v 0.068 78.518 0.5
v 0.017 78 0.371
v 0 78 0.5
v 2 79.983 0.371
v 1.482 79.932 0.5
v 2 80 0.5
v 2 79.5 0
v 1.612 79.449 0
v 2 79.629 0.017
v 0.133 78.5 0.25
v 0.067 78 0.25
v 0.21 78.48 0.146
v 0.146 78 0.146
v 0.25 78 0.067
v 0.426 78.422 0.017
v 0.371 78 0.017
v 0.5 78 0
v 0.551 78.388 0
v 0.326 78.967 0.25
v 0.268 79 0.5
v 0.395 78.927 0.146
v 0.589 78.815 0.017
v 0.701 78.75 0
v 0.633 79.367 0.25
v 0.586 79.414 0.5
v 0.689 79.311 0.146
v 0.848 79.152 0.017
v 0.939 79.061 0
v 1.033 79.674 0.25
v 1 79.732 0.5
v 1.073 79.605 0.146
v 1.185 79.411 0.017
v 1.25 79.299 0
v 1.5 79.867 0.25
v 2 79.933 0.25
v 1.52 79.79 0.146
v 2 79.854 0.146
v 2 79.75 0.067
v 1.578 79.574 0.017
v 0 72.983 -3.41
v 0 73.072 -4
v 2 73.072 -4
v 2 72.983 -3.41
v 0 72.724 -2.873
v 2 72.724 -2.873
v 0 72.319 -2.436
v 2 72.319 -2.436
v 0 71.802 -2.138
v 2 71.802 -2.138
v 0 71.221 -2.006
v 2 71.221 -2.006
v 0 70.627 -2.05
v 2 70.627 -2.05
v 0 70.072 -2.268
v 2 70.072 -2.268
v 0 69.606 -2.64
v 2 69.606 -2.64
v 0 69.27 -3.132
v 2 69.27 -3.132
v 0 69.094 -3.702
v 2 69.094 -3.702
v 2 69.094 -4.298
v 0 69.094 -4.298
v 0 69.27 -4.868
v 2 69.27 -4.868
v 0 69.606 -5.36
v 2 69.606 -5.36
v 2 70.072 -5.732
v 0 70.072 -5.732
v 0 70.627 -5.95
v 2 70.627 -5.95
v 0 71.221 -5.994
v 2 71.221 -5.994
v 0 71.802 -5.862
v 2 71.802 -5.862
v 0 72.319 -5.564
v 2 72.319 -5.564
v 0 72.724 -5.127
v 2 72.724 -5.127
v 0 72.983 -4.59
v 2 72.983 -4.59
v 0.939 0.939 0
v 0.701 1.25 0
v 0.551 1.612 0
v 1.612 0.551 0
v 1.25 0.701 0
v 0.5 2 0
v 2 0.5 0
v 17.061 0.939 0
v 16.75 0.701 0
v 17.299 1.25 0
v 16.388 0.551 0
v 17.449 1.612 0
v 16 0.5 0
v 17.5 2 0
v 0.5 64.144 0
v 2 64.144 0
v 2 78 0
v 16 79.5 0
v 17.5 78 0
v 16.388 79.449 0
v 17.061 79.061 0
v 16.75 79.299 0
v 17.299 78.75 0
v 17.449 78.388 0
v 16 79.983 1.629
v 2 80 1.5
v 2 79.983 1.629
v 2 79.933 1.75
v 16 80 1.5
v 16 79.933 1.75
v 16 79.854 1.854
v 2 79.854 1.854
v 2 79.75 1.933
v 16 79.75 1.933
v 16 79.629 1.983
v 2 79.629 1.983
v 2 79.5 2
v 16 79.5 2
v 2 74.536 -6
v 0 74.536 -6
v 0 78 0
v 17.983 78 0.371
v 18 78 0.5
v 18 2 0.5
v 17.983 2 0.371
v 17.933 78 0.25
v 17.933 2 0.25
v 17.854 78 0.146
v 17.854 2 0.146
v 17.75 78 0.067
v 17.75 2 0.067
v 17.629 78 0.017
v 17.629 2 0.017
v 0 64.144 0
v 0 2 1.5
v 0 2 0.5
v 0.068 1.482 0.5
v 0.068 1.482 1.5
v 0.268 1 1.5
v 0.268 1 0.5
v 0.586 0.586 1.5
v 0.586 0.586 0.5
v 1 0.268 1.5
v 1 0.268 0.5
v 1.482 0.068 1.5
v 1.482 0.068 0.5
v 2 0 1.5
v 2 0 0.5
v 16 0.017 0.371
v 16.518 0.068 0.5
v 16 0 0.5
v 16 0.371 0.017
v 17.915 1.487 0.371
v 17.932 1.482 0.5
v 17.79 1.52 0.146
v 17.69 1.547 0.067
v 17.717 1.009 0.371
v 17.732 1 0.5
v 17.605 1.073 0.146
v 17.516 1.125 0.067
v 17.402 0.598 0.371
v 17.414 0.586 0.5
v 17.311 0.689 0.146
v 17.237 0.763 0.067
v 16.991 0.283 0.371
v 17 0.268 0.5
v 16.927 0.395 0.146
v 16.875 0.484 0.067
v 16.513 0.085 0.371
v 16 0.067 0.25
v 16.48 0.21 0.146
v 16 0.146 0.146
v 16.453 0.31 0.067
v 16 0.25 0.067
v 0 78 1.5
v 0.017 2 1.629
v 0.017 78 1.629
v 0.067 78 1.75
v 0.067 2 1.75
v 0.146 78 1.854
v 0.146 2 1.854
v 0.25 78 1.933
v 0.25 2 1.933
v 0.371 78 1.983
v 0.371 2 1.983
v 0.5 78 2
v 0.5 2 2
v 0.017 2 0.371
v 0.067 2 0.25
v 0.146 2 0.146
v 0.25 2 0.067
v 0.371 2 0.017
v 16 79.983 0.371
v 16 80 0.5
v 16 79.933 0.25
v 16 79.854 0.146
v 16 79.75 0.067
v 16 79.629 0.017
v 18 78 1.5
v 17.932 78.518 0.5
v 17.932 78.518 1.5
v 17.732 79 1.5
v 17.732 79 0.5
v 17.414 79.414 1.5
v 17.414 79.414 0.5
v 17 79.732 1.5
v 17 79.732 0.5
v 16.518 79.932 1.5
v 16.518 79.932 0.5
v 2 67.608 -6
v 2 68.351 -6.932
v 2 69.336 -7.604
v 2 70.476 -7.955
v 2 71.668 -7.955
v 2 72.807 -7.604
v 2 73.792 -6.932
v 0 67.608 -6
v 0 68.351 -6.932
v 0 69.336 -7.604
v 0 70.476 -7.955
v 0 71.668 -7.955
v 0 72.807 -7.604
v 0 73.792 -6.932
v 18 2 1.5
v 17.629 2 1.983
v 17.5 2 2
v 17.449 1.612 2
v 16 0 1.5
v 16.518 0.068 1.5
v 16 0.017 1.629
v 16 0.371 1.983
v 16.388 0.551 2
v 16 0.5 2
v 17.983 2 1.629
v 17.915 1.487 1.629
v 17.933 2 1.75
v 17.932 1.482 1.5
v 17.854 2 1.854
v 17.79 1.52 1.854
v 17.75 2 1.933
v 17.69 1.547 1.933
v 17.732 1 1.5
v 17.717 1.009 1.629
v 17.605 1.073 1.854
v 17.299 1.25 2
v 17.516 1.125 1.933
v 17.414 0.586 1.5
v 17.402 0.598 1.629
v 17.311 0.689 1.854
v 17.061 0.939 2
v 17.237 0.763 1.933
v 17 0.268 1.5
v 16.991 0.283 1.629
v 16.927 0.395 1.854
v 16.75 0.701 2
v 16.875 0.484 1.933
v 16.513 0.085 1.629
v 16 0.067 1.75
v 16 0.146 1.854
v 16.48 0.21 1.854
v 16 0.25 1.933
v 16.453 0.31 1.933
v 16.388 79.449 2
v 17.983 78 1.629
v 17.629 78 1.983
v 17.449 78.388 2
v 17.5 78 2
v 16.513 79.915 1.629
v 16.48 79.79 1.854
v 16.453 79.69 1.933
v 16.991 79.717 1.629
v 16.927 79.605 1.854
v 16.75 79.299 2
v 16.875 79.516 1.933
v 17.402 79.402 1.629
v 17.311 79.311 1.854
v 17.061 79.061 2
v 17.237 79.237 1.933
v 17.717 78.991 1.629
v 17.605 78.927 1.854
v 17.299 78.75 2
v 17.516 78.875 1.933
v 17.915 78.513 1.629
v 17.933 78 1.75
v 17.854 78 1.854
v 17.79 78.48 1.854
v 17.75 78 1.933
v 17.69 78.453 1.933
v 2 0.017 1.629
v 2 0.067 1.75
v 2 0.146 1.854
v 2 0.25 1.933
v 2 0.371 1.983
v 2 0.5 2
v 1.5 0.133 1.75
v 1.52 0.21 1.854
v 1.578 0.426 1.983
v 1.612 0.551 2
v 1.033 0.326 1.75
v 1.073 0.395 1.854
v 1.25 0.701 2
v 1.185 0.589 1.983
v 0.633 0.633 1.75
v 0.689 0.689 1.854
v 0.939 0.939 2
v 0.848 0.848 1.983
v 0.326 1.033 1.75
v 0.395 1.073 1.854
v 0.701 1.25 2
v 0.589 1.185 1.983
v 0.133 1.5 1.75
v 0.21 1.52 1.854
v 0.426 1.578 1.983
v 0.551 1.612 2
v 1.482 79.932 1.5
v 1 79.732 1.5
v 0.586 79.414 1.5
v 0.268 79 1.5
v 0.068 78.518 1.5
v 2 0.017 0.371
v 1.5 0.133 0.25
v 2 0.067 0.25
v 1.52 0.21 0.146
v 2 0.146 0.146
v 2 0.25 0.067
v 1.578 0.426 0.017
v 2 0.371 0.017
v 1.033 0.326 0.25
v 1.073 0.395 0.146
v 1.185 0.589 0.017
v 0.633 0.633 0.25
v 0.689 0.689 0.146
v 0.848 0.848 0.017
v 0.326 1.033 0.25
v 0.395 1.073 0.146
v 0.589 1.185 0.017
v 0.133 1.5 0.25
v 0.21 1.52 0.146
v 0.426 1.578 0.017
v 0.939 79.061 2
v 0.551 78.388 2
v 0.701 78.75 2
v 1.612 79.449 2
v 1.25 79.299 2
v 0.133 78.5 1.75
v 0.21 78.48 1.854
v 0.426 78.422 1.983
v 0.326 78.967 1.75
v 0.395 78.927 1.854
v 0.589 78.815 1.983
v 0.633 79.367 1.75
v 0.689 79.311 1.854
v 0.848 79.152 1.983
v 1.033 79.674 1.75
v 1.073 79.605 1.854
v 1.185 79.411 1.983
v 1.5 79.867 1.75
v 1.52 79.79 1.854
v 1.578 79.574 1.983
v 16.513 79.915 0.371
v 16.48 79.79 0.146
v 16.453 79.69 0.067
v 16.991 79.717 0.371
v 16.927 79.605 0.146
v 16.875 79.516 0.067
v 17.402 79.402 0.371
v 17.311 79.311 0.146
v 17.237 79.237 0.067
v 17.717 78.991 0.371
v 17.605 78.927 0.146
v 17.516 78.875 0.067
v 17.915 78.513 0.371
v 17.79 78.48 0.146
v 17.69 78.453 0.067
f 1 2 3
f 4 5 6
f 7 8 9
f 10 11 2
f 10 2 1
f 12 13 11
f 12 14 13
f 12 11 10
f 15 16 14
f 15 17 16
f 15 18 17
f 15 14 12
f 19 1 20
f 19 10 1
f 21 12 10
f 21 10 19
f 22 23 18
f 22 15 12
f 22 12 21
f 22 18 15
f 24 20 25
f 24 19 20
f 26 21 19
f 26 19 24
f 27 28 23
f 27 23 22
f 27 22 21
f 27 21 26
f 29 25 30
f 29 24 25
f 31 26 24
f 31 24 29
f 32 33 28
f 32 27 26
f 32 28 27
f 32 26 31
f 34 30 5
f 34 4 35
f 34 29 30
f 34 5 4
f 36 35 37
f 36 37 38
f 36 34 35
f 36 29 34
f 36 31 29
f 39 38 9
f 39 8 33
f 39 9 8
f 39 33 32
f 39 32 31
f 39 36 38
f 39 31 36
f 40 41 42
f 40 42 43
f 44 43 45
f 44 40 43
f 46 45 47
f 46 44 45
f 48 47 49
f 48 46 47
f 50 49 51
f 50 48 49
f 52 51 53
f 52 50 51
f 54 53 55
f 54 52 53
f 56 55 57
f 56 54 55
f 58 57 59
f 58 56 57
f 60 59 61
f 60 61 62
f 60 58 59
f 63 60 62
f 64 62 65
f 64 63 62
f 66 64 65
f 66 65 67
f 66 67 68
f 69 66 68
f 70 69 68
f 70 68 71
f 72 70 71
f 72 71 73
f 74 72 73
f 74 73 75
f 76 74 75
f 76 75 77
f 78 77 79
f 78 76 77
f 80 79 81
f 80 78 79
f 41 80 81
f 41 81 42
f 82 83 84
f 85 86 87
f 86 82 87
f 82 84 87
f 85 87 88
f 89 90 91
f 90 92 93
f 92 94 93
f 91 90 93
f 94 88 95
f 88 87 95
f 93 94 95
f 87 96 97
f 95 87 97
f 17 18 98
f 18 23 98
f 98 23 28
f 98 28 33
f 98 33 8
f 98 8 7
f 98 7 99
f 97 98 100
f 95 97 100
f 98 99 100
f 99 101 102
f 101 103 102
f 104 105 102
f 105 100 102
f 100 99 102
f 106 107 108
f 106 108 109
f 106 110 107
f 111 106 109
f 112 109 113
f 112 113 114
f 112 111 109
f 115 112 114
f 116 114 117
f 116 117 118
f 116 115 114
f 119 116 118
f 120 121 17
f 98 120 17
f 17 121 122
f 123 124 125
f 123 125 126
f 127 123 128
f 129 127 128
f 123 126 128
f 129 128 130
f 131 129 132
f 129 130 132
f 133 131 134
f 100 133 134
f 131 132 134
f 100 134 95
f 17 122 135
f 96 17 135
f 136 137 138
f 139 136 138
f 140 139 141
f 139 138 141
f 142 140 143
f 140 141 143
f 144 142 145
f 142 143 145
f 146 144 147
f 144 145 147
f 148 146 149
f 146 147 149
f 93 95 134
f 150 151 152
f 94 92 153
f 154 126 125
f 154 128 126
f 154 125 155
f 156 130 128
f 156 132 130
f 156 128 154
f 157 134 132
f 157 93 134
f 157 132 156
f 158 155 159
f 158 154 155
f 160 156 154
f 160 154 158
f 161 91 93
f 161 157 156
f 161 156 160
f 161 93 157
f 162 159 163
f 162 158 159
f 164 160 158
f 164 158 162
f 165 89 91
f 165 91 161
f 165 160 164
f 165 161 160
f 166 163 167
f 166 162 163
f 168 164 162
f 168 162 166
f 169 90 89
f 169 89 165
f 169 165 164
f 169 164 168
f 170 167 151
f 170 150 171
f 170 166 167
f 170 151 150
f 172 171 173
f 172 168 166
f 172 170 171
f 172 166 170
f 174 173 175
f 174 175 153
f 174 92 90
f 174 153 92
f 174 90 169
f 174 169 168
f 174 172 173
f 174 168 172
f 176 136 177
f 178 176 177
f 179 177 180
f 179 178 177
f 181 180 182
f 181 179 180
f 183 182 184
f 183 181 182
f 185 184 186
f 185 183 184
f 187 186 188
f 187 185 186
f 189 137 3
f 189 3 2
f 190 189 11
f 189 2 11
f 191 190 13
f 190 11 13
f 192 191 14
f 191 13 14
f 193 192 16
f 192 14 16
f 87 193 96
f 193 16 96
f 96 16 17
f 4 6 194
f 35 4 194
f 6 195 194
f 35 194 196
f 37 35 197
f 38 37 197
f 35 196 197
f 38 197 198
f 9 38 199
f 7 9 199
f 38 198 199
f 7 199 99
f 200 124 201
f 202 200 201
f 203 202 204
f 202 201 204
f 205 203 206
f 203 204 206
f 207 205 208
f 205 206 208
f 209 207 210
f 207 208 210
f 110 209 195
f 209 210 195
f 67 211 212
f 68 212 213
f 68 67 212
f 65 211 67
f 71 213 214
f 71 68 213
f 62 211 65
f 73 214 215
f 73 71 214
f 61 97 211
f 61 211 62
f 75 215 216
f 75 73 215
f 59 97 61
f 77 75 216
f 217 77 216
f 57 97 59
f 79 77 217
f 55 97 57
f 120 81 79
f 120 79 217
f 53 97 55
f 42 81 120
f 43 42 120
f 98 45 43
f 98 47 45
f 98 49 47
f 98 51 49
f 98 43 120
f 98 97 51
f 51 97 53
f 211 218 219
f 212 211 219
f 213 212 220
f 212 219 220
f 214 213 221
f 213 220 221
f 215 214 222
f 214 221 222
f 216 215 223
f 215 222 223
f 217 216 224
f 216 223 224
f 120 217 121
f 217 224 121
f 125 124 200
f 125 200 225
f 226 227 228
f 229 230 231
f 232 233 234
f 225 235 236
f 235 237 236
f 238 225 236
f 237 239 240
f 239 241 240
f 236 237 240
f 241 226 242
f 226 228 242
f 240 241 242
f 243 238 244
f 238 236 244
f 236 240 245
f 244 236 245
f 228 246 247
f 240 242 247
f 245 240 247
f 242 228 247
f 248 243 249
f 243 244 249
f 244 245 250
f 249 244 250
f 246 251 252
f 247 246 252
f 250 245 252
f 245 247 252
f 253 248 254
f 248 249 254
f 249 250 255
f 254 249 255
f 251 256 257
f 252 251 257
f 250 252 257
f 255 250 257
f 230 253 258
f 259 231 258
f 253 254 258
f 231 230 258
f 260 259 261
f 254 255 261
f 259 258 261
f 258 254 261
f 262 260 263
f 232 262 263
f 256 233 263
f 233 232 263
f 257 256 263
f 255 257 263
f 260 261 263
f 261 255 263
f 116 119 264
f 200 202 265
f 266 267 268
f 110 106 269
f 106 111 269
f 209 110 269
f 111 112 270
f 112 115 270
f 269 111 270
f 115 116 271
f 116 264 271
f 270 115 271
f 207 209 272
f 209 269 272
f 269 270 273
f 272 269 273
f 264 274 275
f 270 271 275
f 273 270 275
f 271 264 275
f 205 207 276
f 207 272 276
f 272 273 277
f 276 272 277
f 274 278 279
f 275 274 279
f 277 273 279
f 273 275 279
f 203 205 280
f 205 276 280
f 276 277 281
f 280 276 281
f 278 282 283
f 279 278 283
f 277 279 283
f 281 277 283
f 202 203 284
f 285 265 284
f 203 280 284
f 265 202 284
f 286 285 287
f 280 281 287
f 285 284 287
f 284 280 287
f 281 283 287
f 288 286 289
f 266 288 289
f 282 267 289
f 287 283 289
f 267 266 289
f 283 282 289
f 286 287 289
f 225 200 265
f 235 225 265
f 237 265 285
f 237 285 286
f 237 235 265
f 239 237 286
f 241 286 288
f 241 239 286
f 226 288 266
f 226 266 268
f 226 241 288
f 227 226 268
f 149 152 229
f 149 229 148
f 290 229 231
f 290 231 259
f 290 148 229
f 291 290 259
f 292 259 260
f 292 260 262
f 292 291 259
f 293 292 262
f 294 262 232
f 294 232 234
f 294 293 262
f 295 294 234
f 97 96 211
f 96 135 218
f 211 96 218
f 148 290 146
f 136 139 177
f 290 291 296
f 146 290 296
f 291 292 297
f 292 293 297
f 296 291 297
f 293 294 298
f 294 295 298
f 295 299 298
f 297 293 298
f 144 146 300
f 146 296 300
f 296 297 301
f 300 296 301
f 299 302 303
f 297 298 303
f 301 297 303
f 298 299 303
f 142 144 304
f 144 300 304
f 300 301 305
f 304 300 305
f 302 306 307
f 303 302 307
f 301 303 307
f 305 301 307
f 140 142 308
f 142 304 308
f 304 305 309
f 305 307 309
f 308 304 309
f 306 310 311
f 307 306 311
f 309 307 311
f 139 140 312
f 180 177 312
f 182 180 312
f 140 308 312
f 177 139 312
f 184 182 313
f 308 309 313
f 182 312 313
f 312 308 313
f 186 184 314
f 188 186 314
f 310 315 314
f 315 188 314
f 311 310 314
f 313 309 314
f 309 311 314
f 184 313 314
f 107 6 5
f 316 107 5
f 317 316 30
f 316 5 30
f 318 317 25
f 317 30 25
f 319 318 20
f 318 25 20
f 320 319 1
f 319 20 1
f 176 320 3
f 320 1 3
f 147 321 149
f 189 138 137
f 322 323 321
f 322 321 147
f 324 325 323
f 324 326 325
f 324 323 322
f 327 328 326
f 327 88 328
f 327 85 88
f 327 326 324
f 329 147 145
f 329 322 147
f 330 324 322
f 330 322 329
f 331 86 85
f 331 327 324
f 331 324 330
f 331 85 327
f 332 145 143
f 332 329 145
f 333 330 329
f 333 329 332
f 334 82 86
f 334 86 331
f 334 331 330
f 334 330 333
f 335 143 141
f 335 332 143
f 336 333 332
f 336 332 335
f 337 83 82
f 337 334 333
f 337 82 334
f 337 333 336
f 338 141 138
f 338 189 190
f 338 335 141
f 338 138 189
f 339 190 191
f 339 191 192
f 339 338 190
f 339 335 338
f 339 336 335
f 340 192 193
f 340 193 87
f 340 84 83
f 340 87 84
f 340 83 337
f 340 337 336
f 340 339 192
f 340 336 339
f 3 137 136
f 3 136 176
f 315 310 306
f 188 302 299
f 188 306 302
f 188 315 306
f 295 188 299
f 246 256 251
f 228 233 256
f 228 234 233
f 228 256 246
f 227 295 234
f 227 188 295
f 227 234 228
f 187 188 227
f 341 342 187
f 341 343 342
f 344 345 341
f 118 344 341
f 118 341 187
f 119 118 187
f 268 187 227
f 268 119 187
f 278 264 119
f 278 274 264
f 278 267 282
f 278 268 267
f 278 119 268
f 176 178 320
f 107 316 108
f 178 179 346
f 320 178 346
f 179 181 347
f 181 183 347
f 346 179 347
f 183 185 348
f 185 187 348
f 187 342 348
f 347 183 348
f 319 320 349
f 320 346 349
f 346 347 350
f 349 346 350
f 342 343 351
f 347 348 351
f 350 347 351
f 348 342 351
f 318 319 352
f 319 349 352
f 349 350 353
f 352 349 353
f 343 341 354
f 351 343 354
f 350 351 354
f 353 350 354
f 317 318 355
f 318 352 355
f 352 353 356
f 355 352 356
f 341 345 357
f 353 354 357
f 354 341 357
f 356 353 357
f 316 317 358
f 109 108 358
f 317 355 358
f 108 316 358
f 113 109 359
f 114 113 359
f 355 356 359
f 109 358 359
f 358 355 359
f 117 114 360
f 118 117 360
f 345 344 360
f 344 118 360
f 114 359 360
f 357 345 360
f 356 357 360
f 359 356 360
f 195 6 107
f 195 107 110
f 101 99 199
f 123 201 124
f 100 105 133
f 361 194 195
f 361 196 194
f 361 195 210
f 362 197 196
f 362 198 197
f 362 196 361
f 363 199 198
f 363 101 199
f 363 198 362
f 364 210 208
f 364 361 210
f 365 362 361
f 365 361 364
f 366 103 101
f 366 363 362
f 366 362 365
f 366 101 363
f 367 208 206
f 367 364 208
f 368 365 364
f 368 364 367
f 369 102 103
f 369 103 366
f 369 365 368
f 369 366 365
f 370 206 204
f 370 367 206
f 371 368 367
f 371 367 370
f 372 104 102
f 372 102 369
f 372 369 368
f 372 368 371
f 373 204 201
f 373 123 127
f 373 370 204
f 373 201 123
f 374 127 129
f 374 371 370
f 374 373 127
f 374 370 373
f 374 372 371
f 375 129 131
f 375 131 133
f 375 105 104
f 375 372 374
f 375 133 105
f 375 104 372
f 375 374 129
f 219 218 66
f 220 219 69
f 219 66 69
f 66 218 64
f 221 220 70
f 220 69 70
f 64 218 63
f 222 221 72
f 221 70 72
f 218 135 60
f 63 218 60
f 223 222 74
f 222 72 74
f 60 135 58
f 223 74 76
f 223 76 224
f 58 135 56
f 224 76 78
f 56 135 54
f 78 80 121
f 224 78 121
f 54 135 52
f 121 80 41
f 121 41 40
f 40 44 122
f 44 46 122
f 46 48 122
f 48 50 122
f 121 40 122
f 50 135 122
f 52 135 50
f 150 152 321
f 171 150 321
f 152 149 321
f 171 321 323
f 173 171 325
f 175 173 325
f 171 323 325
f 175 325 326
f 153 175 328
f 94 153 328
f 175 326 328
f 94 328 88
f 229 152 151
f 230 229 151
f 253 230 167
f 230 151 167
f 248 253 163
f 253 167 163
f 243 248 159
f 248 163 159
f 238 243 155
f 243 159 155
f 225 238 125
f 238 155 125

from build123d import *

# Parameters (mm, degrees)
PAD_DEPTH    = 2
FILLET_R     = 0.5
SKETCH001_R  = 2
PAD001_DEPTH = 2


with BuildPart() as part:
    # Sketch → Pad (new body)
    with BuildSketch(Plane.XY):
        with BuildLine():
            ThreePointArc((0, 2), (0.585786, 0.585786), (2, 0))
            Line((16, 0), (2, 0))
            ThreePointArc((16, 0), (17.414214, 0.585786), (18, 2))
            Line((18, 78), (18, 2))
            ThreePointArc((18, 78), (17.414214, 79.414214), (16, 80))
            Line((2, 80), (16, 80))
            ThreePointArc((2, 80), (0.585786, 79.414214), (0, 78))
            Line((0, 2), (0, 78))
        make_face()
    extrude(amount=PAD_DEPTH)

    # Fillet
    fillet_edges = [part.edges().sort_by_distance(p)[0] for p in [
        (18, 78, 1),
        (18, 2, 1),
        (18, 40, 0),
        (18, 40, 2),
    ]]
    fillet(fillet_edges, radius=FILLET_R)

    # Sketch001 → Pad001 (join)
    with BuildSketch(Plane.YZ):
        with BuildLine():
            Line((78, 0), (64.143594, 0))
            Line((64.143594, 0), (67.607695, -6))
            ThreePointArc((67.607695, -6), (71.071797, -8), (74.535898, -6))
            Line((74.535898, -6), (78, 0))
        make_face()
        with Locations((71.071797, -4)):
            Circle(SKETCH001_R, mode=Mode.SUBTRACT)
    extrude(amount=PAD001_DEPTH)


solid = part.part
